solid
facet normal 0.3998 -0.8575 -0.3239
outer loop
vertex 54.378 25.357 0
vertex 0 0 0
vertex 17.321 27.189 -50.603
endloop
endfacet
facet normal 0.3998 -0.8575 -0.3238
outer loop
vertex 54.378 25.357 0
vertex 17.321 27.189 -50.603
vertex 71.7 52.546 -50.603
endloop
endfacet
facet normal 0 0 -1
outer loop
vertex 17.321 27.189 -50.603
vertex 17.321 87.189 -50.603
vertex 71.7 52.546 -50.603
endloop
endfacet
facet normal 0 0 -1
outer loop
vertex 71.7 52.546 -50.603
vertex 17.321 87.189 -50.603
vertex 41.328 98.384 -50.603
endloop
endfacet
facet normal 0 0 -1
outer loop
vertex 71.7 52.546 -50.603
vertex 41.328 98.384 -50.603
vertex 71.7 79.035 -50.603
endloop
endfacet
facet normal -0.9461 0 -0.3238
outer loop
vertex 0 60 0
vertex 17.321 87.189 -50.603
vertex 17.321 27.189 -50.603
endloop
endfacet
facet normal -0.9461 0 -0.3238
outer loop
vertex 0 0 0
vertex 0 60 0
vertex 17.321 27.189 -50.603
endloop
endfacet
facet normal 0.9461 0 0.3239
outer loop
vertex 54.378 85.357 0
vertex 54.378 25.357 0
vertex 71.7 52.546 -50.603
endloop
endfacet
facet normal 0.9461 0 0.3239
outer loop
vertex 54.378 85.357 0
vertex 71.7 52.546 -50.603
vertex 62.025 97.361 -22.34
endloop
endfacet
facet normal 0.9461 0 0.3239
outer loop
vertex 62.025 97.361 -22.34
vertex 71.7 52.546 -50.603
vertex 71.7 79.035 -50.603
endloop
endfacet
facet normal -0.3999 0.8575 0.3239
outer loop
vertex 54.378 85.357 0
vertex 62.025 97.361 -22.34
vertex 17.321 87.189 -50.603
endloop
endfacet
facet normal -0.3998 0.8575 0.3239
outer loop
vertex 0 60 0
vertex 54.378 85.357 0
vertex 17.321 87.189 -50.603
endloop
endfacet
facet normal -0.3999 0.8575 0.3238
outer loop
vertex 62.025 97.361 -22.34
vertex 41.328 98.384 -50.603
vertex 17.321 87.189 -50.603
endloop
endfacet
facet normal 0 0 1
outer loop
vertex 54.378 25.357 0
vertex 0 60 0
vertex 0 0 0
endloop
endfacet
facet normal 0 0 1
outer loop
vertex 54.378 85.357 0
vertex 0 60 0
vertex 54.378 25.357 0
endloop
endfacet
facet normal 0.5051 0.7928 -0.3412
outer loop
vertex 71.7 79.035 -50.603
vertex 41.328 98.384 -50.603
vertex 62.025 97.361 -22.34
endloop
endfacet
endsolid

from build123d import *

# Parameters (mm, degrees)
SCHNITT_LINEAR_AUSTRAGEN1_DEPTH = 27.567610021


with BuildPart() as part:
    # Austragung1: sweep along a path in SK Pfad
    with BuildLine(Plane(origin=(0, 0, 0), x_dir=(0, 0, -1), z_dir=(0.843391446, -0.537299608, 0))) as austragung1_path:
        Line((0, 0), (50.603486749, 32.237976501))
    # SK Grundriss → Austragung1 (sweep)
    with BuildSketch(Plane.XY):
        Polygon((0, 0), (54.378467222, 25.357095704), (54.378467222, 85.357095704), (0, 60), align=None)
    sweep(path=austragung1_path.line)

    # Skizze2 → Schnitt-Linear austragen1 (cut, through all)
    with BuildSketch(Plane(origin=(58.655853729, 92.071247611, -39.620266542), x_dir=(0.863081214, -0.463933603, 0.199640751), z_dir=(0.505065162, 0.7927935, -0.341156339))):
        Polygon((15.113369899, 15.241721945), (-20.07640222, 7.593557233), (3.904191248, -17.963473004), align=None)
    extrude(amount=SCHNITT_LINEAR_AUSTRAGEN1_DEPTH, mode=Mode.SUBTRACT)


solid = part.part
